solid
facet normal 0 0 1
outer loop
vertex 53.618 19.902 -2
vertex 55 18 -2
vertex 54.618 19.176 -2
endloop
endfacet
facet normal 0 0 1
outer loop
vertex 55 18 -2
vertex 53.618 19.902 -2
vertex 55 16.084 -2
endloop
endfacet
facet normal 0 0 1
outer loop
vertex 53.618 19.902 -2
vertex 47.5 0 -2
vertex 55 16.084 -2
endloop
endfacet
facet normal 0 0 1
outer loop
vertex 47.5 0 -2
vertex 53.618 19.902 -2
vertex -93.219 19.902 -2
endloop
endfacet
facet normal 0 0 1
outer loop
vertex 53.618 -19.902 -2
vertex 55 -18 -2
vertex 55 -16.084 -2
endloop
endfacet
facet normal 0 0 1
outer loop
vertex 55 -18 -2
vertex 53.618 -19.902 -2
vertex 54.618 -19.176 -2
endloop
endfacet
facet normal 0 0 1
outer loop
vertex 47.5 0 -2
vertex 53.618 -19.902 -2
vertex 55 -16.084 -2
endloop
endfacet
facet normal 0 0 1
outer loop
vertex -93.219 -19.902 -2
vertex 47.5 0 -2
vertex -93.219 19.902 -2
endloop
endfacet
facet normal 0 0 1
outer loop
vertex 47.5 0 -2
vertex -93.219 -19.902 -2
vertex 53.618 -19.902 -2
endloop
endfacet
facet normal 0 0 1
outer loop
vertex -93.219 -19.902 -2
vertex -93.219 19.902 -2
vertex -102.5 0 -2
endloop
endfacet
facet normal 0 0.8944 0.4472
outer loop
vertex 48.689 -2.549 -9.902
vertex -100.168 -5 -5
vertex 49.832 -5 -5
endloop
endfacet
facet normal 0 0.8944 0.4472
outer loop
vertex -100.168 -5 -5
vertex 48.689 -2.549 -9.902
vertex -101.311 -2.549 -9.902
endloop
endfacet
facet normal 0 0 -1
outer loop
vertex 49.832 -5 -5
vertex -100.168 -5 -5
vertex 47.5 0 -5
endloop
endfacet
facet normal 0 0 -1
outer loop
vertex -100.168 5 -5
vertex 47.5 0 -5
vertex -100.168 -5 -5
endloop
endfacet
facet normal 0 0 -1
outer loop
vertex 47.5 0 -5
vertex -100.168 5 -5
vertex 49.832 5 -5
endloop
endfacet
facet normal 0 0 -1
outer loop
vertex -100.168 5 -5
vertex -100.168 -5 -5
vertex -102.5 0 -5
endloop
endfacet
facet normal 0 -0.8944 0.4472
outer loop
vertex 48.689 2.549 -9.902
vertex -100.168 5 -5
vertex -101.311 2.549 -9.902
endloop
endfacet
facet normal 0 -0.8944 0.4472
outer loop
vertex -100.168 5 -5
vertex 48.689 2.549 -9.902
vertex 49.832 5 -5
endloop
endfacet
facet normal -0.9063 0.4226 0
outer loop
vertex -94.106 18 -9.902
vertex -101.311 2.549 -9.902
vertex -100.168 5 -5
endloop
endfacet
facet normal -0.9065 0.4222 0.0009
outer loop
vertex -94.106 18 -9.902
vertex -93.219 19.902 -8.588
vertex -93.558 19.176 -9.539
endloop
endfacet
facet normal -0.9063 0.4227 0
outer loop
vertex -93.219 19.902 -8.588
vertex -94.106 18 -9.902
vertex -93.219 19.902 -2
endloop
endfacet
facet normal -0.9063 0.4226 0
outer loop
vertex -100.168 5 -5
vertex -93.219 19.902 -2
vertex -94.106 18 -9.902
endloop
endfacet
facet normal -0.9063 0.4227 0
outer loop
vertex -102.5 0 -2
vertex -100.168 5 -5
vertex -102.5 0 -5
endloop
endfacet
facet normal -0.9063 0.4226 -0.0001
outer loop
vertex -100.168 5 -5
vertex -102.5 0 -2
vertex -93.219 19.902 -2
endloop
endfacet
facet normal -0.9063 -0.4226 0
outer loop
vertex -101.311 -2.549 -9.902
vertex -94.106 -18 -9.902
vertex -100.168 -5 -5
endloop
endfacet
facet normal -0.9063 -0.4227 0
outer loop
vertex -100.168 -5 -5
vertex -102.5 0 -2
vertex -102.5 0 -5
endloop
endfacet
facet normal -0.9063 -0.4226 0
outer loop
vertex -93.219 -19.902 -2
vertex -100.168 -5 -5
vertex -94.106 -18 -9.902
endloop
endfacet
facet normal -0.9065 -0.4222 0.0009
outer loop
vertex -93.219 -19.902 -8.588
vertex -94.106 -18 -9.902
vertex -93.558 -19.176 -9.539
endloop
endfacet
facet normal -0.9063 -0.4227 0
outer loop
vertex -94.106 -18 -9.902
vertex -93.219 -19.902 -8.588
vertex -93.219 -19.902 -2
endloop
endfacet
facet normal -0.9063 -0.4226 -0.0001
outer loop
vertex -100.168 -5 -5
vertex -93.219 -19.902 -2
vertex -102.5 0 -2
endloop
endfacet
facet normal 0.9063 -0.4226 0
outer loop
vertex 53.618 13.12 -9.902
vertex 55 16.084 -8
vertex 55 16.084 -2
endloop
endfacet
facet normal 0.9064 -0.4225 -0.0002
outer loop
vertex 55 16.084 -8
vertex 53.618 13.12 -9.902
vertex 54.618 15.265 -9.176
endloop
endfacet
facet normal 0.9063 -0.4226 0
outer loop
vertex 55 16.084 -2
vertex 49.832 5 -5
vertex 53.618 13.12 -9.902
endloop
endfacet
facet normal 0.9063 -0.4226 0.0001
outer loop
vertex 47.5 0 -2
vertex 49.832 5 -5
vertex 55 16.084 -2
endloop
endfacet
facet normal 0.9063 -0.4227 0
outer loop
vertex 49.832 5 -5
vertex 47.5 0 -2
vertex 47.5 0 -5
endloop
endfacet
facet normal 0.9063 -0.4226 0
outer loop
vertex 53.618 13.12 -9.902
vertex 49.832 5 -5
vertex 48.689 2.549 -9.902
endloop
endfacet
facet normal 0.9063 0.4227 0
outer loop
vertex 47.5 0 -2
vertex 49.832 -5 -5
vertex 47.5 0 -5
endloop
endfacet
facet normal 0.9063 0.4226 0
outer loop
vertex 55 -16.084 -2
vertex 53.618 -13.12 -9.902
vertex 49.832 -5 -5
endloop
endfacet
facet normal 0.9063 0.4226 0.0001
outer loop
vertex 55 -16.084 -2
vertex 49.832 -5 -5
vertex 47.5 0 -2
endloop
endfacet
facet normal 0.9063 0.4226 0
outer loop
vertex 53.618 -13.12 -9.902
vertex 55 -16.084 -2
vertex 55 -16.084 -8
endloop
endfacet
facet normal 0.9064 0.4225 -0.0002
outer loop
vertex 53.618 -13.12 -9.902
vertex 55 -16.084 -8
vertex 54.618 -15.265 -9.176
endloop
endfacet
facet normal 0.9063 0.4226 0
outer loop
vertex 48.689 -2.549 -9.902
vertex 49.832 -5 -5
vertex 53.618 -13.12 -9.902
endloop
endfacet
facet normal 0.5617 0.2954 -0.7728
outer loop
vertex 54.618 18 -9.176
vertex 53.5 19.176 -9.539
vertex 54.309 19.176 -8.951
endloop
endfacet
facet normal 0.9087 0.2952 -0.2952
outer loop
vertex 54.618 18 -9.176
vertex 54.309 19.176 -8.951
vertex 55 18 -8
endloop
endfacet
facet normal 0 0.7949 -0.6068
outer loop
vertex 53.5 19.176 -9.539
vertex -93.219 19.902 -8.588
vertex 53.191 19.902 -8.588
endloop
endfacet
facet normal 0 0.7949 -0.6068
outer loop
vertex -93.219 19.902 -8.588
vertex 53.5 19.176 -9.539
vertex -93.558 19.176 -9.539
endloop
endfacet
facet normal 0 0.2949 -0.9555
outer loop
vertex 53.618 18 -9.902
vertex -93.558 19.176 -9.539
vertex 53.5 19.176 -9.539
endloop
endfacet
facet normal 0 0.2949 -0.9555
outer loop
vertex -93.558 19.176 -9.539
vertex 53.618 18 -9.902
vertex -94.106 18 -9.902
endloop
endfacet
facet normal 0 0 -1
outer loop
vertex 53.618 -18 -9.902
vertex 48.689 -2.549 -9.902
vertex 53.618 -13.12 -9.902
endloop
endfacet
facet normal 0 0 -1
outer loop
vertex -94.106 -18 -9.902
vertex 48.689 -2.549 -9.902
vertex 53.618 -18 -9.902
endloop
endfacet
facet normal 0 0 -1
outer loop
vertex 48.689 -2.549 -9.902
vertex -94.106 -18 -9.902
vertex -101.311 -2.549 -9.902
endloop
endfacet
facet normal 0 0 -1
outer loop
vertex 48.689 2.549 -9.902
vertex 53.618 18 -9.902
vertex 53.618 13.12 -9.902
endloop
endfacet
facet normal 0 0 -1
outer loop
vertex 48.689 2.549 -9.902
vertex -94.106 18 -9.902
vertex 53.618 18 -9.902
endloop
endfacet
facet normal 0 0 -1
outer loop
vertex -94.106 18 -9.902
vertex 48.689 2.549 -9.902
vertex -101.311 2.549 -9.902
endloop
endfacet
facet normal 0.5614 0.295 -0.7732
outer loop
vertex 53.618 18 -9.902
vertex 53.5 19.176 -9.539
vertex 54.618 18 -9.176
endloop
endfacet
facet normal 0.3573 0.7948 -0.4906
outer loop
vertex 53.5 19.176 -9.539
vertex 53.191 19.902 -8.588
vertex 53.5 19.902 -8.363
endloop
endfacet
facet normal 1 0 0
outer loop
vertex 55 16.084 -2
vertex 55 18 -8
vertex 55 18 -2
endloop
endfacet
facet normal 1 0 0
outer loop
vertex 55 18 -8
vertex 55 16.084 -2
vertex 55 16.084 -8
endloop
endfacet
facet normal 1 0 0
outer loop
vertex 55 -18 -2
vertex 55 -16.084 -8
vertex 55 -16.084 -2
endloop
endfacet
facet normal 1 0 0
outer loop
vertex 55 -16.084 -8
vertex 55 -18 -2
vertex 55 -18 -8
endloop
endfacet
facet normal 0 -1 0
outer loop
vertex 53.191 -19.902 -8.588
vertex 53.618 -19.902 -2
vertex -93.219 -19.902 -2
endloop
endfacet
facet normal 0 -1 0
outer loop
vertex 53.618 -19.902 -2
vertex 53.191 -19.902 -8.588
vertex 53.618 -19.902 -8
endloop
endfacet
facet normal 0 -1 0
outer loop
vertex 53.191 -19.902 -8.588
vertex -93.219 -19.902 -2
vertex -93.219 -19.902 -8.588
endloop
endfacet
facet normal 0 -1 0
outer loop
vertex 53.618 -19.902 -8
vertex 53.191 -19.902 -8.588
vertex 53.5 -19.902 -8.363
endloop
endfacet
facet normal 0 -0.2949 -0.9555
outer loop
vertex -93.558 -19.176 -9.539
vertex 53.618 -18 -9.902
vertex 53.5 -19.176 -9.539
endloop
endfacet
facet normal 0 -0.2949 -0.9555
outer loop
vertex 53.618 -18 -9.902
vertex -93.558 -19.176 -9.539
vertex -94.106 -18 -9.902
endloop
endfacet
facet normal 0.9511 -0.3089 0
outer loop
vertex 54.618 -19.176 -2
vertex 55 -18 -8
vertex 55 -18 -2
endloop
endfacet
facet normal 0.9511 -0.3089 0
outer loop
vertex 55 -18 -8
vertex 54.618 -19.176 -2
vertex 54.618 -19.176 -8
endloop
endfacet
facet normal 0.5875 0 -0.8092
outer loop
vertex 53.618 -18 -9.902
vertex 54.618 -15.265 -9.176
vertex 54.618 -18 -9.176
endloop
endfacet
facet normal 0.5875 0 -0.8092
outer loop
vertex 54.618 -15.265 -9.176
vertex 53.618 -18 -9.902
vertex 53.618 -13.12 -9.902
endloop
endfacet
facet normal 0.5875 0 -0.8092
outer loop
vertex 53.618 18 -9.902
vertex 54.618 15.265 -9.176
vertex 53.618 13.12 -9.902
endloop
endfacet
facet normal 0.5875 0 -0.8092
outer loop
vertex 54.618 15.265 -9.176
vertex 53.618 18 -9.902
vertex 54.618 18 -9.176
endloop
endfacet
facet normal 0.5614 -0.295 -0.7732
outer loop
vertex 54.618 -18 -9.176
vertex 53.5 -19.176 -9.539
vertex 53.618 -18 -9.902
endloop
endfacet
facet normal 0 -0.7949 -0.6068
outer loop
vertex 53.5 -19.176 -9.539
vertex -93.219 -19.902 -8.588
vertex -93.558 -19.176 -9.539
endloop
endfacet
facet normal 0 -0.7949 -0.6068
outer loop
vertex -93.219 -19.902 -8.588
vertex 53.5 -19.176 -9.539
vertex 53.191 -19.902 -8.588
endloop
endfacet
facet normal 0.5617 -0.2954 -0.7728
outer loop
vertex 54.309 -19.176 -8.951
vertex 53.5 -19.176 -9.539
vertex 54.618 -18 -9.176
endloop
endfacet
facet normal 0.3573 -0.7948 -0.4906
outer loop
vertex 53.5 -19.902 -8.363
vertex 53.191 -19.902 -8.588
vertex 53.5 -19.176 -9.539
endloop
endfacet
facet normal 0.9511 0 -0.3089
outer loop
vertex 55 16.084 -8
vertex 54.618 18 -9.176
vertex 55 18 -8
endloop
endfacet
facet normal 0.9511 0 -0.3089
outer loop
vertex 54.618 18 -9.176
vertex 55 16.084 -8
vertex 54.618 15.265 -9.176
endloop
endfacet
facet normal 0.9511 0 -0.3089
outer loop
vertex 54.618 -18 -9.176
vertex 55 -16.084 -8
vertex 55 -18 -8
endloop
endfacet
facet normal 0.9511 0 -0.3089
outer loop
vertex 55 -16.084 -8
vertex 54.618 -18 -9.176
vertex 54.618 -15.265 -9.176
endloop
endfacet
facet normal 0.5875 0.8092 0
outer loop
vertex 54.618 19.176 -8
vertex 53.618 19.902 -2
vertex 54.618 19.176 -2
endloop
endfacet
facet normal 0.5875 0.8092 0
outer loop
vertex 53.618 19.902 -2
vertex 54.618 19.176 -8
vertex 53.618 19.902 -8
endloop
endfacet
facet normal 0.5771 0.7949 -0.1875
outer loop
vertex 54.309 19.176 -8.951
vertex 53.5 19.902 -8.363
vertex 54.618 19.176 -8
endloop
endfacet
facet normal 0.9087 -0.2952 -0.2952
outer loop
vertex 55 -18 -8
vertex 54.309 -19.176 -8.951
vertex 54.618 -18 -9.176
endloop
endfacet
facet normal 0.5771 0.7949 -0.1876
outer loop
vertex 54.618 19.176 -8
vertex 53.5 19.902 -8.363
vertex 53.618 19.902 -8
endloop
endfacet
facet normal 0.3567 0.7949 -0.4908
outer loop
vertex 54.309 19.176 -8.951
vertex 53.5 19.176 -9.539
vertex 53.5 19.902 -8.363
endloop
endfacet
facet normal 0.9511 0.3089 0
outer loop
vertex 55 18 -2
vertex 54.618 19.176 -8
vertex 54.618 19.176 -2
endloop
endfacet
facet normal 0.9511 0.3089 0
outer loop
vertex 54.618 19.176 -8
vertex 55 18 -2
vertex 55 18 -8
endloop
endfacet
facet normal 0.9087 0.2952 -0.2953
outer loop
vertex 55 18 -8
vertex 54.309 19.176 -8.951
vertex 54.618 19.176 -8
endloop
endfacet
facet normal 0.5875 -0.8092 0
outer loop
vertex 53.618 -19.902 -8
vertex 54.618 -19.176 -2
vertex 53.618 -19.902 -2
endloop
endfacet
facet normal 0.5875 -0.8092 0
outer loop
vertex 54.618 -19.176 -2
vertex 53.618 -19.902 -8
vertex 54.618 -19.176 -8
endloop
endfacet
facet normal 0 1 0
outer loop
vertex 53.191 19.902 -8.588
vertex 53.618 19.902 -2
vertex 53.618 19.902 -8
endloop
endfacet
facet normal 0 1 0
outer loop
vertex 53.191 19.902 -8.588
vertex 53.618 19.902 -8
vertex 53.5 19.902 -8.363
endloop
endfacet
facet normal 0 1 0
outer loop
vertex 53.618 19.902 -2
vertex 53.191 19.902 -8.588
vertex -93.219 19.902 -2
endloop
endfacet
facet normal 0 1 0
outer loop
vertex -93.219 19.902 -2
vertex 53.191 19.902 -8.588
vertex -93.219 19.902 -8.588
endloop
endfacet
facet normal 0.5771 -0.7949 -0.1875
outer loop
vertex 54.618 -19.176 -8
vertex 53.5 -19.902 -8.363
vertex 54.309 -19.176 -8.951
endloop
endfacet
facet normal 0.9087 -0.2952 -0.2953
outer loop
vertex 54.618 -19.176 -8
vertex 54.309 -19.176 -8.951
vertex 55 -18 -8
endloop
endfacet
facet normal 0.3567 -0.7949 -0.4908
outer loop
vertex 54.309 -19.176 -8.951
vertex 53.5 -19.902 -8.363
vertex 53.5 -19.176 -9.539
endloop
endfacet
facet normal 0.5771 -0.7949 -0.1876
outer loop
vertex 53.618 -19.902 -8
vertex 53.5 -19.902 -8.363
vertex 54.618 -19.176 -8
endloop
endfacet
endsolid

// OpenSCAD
// file: globals.scad
/*
Most things in this file is represented as one millimeter, so keep that in mind while changing things.
Some of the setting are not mm but at variables that you can set, such as 2*x=2x and you are setting what x is.
I will try to specify when things are variables and not exact measurements.
*/

obj_leg = 30;
leg_length = 5.5;
small_number = 0.001;
metal_core_rode_global = 5;


///////////////// number of holes /////////////////////
z_hole_number = 8;
other_holes = 8;

///////////////// Pins /////////////////////

//pins that poke out
ball_size = 10;
pin_height = 20;
pin_diameter = 6;


//holes
hole_ball_size = ball_size;
hole_pin_height = pin_height;
hole_pin_diameter = pin_diameter;

///////////////// Z THINGS /////////////////////

berring_slot_width = 7.5;
berring_slot_depth = 6.5;
metal_core_rode = 5;

///////////////// X THINGS /////////////////////

//male dove tails
max_width=10;
min_width=5;
depth=5;
height=obj_leg/2;

//female dove tails, this is found on the y mounts
girl_max_width=11;
girl_min_width=5;
girl_depth=5;
girl_height=obj_leg;


///////////////// Y THINGS /////////////////////
/*
The Y is so normal that all of those global variables at the top should change all of the setting in it, this section is set her incase there are variables set in the future development of this project.
*/
// file: include.scad
//////////////////      END SECTION       //////////////////

	module added_pins(){
		difference(){
			union(){
				translate([30/(15/4),obj_leg*leg_length,30/(15/4)]) pin();
				translate([30/(15/4)+14.5,obj_leg*leg_length,30/(15/4)+14]) pin();
			}
			union(){
							translate([30/(15/4)+13.5,obj_leg*leg_length-20,30/(15/4)+5])cube(size=[2,40,15]);
							translate([30/(15/4)+7.5,obj_leg*leg_length-20,30/(15/4)+15])rotate([0,90,0]) cube(size=[2,40,15]);	

							translate([30/(15/4)-1,obj_leg*leg_length-20,30/(15/4)-8])cube(size=[2,40,15]);
							translate([30/(15/4)-10,obj_leg*leg_length-20,30/(15/4)+1])rotate([0,90,0]) cube(size=[2,40,15]);
			}
		}
	}
	module taken_pins() {
		translate([30/(15/4)+14,obj_leg*leg_length-10,30/(15/4)]) mirror_pin();
		translate([30/(15/4),obj_leg*leg_length-10,30/(15/4)+15]) mirror_pin();
	}


//////////////////      OTHER STUFF       //////////////////

	module holes() {
		rotate([0,0,90]) for(y=[0:other_holes])
		translate([obj_leg+y*15,-15.5,7.5]) union() {
			translate([7.5,0,15]) hole_up();
			hole_down();
		}
	}
	module extend_holes() {
	module top(){
		rotate([0,0,90]) for(y=[0:other_holes+1])
		translate([(30/4)+y*15,-15.5,7.5]) union() {
			translate([7.5,0,15]) hole_up();
		}
	}
	module bottom(){
		rotate([0,0,90]) for(y=[0:other_holes+2])
		translate([(30/4)+y*15,-15.5,7.5]) union() {
			hole_down();
		
}
	}
	union(){
		top();
		bottom();
	}
	}

	module hole() {
		union() {
			rotate([90, 90, 0]) cylinder(h=40, d=hole_pin_diameter, center=true);
			translate([0,7.5,0]) sphere(d=hole_ball_size);
			translate([0,-6,0]) sphere(d=hole_ball_size);
		}
	}
	module hole_up() {
		union() {
			rotate([90, 90, 0]) cylinder(h=40, d=hole_pin_diameter, center=true);
			translate([0,7.5,10]) cylinder(h=hole_pin_height, d=hole_pin_diameter, center=true);
			translate([0,-6,10]) cylinder(h=hole_pin_height, d=hole_pin_diameter, center=true);
			translate([0,7.5,0]) sphere(d=hole_ball_size);
			translate([0,-6,0]) sphere(d=hole_ball_size);
		}
	}
	module hole_down() {
		union() {
			rotate([90, 90, 0]) cylinder(h=40, d=hole_pin_diameter, center=true);
			translate([0,7.5,-10]) cylinder(h=hole_pin_height, d=hole_pin_diameter, center=true);
			translate([0,-6,-10]) cylinder(h=hole_pin_height, d=hole_pin_diameter, center=true);
			translate([0,7.5,0]) sphere(d=hole_ball_size);
			translate([0,-6,0]) sphere(d=hole_ball_size);
		}
	}
	module pin() {
		union() {
			rotate([90, 90, 0]) cylinder(h=pin_height, d=pin_diameter, center=true);
			translate([0,7.5,0]) sphere(d=ball_size);
		}
	}

	module mirror_pin() {
		rotate([90, 90, 0]) cylinder(h=hole_pin_height+small_number, d=hole_pin_diameter, center=true);
		translate([0,-(pin_height-(ball_size/2)),0]) sphere(d=ball_size);
	}


//////////////////      SOME RACK AND Z THINGS       //////////////////

module z_holes() {
    rotate([0,-90,0]) for(z=[0:z_hole_number])
    translate([22.5+z*15,16,-12])
        hole();
}

module pin_cuts() {
	union(){
		cube(size=[2,10,40], center=true);
		rotate([0,0,90]) cube(size=[2,10,40], center=true);
	}
}
module pin_uncut() {
	union(){
		rotate([0, 0, 90]) cylinder(h=hole_pin_height, d=hole_pin_diameter, center=true);
		translate([0,0,10]) sphere(d=ball_hole);
	}
}


module pin_out() {
	union(){
		rotate([0, 0, 90]) cylinder(h=pin_height, d=pin_diameter, center=true);
		translate([0,0,10]) sphere(d= ball_size);
	}
}


module pins_z(){
	difference() {
		pin_out();
		pin_cuts();
	}
}
//////////////////      RACK AND SLIDE     ///////////////////

module straight_pins() {
	for(z=[0:((((obj_leg*leg_length)*2)-(obj_leg*2))/3)/14.5]) rotate([-90,0,0]) translate([z*15,30/(15/4),14]) pins_z();
	for(z=[0:((((obj_leg*leg_length)*2)-(obj_leg*2))/3)/14.5]) rotate([-90,0,0]) translate([z*15,30/(15/4)-14,14]) pins_z();
}
module stagger_pins() {
	for(z=[0:((((obj_leg*leg_length)*2)-(obj_leg*2))/3)/14.5]) rotate([-90,0,0]) translate([z*15,30/(15/4),14]) pins_z();
	for(z=[0:((((obj_leg*leg_length)*2)-(obj_leg*2))/3)/14.5]) rotate([-90,0,0]) translate([z*15+7,30/(15/4)-14,14]) pins_z();
}


//////////////////      DOVE TAIL       //////////////////

module male_dovetail(height) {
	dovetail_3d(max_width,min_width,depth,height);
}

module dovetail_3d(max_width=11, min_width=5, depth=5, height=30) {
	linear_extrude(height=height, convexity=2)
		dovetail_2d(max_width,min_width,depth);
}

module dovetail_2d(max_width=11, min_width=5, depth=5) {
	angle=atan((max_width/2-min_width/2)/depth);
	echo("angle: ", angle);
	polygon(paths=[[0,1,2,3,0]], points=[[-min_width/2,0], [-max_width/2,depth], [max_width/2, depth], [min_width/2,0]]);
}

//bow tie
	module tie_end(height){
				rotate([0,0,0]) translate([0,-0.01,((obj_leg/2)/2)]) male_dovetail(height);
				rotate([0,90,0]) translate([0,-0.01,((obj_leg/2)/2)]) male_dovetail(height);
				rotate([0,180,0]) translate([0,-0.01,((obj_leg/2)/2)]) male_dovetail(height);
				rotate([0,-90,0]) translate([0,-0.01,((obj_leg/2)/2)]) male_dovetail(height);
	}

module bow_support(){
	difference(){
		intersection(){
			translate([-15,0,-15]) cube([30,9,30]);
			scale([1.05,1.05,1.05]) rotate([0,45,0]) tie_end();
		}
		cube([29.2,29.2,29.2], center=true);
	}
}

	module wrap(){
		depth = 30;
				translate([-15,30,15]) rotate([90,180,90]) male_dovetail(height=depth);
				rotate([0,90,0]) translate([-15,30,15]) rotate([90,180,90]) male_dovetail(height=depth);
				rotate([0,180,0]) translate([-15,30,15]) rotate([90,180,90]) male_dovetail(height=depth);
				rotate([0,-90,0]) translate([-15,30,15]) rotate([90,180,90]) male_dovetail(height=depth);
	}
// main file
include <include.scad>;
include <globals.scad>;


//globals

obj_height = 40;
units = 8; //only even numbers
tail_depth = 8;
tie_scale_x = 1;
tie_scale_y = 1;
tie_scale_z = 1;

resolution = 10;

//good things
module rounded_cube(width,depth,height){
    hull(){
        translate([width/2-diamiter/2,depth/2-diamiter/2,height/2-diamiter/2]) sphere(d=diamiter);
        translate([width/2-(diamiter/2),depth/2-(diamiter/2),-height/2+(diamiter/2)]) sphere(d=diamiter);
        translate([-width/2+diamiter/2,depth/2-diamiter/2,height/2-diamiter/2]) sphere(d=diamiter);
        translate([-width/2+(diamiter/2),depth/2-(diamiter/2),-height/2+(diamiter/2)]) sphere(d=diamiter);
        
        translate([width/2-diamiter/2,-depth/2+diamiter/2,height/2-diamiter/2]) sphere(d=diamiter);
        translate([width/2-(diamiter/2),-depth/2+(diamiter/2),-height/2+(diamiter/2)]) sphere(d=diamiter);
        translate([-width/2+diamiter/2,-depth/2+diamiter/2,height/2-diamiter/2]) sphere(d=diamiter);
        translate([-width/2+(diamiter/2),-depth/2+(diamiter/2),-height/2+(diamiter/2)]) sphere(d=diamiter);
    }
}  
				module tie_taken(){
					difference(){
							#translate([0,tail_depth,0]) rotate([0,90,180]) scale([tie_scale_x,tie_scale_z,tie_scale_y])  male_dovetail(height=30);
					}
				}




//herring bone style rack made from inkscape and OpenScad
module rackObject() {

module rackHalf(){
	intersection() {
		union() {
			rotate(a=[0,-25,0]) {
				linear_extrude(height = obj_height*5, center = true, convexity = 10)
			   	import (file = "rack.dxf", layer = "Layer_1");
			}
		}
			translate([0, 0, obj_height/4*-1]) cube(center = true, [31, 50, obj_height/2]);
	}
}				
module rackFull(){
	intersection() {
		union() {
			mirror([0,0,1]) rackHalf();
			rackHalf();
		}
		union() {
			cube(center = true, [20, 30, obj_height-8]);

		}
	}
}
		for(rack_length=[-units:5]){ 
				translate([rack_length*20,0,0]) {
					intersection(){
						rackFull();
						#scale([1,.25,1]) translate([0,5,0]) rotate([0,90,0]) cylinder(r=15, h=40, center=true);
					}
				}
		}
		for(rack_length=[-units:1]){ 
			difference(){
				translate([30*rack_length+15,6,0]) cube([30,8,40], center=true);
			}
		}
}
diamiter = 4;

  
intersection(){
//translate([0,0,-10]) cube([20,20,20]);
	intersection(){
					rotate([-90,0,0]) translate([-10-((units-2)*15),0,0]) translate([30,0,0]) rounded_cube(30*units+10,20,40,$fn=resolution);
	union(){ 
		rotate([-90,0,0]) intersection(){
			difference(){
				rackObject();
				for(rack_length=[-units:1]){ 
						translate([30*rack_length+30,2,0]) tie_taken();
				}
			}

			difference(){
				union(){
					translate([30,0,0]) rounded_cube(30*units,20,40,$fn=50);
					translate([-12.5-((units-2)*15),-5,0]) rotate([0,25,0]) cube([30,30,30]);
					mirror([0,0,1]) translate([-12.5-((units-2)*15),-5,0]) rotate([0,25,0]) cube([30,30,30]);
				}
				union(){
					translate([47.5,-5,0]) rotate([0,25,0]) cube([units*30,30,units*30]);
					mirror([0,0,1]) translate([47.5,-5,0]) rotate([0,25,0]) cube([units*30,30,units*30]);
				}
			}
	//intersection
	}
	//union
	}
	//intersection
	}
//intersection
}
